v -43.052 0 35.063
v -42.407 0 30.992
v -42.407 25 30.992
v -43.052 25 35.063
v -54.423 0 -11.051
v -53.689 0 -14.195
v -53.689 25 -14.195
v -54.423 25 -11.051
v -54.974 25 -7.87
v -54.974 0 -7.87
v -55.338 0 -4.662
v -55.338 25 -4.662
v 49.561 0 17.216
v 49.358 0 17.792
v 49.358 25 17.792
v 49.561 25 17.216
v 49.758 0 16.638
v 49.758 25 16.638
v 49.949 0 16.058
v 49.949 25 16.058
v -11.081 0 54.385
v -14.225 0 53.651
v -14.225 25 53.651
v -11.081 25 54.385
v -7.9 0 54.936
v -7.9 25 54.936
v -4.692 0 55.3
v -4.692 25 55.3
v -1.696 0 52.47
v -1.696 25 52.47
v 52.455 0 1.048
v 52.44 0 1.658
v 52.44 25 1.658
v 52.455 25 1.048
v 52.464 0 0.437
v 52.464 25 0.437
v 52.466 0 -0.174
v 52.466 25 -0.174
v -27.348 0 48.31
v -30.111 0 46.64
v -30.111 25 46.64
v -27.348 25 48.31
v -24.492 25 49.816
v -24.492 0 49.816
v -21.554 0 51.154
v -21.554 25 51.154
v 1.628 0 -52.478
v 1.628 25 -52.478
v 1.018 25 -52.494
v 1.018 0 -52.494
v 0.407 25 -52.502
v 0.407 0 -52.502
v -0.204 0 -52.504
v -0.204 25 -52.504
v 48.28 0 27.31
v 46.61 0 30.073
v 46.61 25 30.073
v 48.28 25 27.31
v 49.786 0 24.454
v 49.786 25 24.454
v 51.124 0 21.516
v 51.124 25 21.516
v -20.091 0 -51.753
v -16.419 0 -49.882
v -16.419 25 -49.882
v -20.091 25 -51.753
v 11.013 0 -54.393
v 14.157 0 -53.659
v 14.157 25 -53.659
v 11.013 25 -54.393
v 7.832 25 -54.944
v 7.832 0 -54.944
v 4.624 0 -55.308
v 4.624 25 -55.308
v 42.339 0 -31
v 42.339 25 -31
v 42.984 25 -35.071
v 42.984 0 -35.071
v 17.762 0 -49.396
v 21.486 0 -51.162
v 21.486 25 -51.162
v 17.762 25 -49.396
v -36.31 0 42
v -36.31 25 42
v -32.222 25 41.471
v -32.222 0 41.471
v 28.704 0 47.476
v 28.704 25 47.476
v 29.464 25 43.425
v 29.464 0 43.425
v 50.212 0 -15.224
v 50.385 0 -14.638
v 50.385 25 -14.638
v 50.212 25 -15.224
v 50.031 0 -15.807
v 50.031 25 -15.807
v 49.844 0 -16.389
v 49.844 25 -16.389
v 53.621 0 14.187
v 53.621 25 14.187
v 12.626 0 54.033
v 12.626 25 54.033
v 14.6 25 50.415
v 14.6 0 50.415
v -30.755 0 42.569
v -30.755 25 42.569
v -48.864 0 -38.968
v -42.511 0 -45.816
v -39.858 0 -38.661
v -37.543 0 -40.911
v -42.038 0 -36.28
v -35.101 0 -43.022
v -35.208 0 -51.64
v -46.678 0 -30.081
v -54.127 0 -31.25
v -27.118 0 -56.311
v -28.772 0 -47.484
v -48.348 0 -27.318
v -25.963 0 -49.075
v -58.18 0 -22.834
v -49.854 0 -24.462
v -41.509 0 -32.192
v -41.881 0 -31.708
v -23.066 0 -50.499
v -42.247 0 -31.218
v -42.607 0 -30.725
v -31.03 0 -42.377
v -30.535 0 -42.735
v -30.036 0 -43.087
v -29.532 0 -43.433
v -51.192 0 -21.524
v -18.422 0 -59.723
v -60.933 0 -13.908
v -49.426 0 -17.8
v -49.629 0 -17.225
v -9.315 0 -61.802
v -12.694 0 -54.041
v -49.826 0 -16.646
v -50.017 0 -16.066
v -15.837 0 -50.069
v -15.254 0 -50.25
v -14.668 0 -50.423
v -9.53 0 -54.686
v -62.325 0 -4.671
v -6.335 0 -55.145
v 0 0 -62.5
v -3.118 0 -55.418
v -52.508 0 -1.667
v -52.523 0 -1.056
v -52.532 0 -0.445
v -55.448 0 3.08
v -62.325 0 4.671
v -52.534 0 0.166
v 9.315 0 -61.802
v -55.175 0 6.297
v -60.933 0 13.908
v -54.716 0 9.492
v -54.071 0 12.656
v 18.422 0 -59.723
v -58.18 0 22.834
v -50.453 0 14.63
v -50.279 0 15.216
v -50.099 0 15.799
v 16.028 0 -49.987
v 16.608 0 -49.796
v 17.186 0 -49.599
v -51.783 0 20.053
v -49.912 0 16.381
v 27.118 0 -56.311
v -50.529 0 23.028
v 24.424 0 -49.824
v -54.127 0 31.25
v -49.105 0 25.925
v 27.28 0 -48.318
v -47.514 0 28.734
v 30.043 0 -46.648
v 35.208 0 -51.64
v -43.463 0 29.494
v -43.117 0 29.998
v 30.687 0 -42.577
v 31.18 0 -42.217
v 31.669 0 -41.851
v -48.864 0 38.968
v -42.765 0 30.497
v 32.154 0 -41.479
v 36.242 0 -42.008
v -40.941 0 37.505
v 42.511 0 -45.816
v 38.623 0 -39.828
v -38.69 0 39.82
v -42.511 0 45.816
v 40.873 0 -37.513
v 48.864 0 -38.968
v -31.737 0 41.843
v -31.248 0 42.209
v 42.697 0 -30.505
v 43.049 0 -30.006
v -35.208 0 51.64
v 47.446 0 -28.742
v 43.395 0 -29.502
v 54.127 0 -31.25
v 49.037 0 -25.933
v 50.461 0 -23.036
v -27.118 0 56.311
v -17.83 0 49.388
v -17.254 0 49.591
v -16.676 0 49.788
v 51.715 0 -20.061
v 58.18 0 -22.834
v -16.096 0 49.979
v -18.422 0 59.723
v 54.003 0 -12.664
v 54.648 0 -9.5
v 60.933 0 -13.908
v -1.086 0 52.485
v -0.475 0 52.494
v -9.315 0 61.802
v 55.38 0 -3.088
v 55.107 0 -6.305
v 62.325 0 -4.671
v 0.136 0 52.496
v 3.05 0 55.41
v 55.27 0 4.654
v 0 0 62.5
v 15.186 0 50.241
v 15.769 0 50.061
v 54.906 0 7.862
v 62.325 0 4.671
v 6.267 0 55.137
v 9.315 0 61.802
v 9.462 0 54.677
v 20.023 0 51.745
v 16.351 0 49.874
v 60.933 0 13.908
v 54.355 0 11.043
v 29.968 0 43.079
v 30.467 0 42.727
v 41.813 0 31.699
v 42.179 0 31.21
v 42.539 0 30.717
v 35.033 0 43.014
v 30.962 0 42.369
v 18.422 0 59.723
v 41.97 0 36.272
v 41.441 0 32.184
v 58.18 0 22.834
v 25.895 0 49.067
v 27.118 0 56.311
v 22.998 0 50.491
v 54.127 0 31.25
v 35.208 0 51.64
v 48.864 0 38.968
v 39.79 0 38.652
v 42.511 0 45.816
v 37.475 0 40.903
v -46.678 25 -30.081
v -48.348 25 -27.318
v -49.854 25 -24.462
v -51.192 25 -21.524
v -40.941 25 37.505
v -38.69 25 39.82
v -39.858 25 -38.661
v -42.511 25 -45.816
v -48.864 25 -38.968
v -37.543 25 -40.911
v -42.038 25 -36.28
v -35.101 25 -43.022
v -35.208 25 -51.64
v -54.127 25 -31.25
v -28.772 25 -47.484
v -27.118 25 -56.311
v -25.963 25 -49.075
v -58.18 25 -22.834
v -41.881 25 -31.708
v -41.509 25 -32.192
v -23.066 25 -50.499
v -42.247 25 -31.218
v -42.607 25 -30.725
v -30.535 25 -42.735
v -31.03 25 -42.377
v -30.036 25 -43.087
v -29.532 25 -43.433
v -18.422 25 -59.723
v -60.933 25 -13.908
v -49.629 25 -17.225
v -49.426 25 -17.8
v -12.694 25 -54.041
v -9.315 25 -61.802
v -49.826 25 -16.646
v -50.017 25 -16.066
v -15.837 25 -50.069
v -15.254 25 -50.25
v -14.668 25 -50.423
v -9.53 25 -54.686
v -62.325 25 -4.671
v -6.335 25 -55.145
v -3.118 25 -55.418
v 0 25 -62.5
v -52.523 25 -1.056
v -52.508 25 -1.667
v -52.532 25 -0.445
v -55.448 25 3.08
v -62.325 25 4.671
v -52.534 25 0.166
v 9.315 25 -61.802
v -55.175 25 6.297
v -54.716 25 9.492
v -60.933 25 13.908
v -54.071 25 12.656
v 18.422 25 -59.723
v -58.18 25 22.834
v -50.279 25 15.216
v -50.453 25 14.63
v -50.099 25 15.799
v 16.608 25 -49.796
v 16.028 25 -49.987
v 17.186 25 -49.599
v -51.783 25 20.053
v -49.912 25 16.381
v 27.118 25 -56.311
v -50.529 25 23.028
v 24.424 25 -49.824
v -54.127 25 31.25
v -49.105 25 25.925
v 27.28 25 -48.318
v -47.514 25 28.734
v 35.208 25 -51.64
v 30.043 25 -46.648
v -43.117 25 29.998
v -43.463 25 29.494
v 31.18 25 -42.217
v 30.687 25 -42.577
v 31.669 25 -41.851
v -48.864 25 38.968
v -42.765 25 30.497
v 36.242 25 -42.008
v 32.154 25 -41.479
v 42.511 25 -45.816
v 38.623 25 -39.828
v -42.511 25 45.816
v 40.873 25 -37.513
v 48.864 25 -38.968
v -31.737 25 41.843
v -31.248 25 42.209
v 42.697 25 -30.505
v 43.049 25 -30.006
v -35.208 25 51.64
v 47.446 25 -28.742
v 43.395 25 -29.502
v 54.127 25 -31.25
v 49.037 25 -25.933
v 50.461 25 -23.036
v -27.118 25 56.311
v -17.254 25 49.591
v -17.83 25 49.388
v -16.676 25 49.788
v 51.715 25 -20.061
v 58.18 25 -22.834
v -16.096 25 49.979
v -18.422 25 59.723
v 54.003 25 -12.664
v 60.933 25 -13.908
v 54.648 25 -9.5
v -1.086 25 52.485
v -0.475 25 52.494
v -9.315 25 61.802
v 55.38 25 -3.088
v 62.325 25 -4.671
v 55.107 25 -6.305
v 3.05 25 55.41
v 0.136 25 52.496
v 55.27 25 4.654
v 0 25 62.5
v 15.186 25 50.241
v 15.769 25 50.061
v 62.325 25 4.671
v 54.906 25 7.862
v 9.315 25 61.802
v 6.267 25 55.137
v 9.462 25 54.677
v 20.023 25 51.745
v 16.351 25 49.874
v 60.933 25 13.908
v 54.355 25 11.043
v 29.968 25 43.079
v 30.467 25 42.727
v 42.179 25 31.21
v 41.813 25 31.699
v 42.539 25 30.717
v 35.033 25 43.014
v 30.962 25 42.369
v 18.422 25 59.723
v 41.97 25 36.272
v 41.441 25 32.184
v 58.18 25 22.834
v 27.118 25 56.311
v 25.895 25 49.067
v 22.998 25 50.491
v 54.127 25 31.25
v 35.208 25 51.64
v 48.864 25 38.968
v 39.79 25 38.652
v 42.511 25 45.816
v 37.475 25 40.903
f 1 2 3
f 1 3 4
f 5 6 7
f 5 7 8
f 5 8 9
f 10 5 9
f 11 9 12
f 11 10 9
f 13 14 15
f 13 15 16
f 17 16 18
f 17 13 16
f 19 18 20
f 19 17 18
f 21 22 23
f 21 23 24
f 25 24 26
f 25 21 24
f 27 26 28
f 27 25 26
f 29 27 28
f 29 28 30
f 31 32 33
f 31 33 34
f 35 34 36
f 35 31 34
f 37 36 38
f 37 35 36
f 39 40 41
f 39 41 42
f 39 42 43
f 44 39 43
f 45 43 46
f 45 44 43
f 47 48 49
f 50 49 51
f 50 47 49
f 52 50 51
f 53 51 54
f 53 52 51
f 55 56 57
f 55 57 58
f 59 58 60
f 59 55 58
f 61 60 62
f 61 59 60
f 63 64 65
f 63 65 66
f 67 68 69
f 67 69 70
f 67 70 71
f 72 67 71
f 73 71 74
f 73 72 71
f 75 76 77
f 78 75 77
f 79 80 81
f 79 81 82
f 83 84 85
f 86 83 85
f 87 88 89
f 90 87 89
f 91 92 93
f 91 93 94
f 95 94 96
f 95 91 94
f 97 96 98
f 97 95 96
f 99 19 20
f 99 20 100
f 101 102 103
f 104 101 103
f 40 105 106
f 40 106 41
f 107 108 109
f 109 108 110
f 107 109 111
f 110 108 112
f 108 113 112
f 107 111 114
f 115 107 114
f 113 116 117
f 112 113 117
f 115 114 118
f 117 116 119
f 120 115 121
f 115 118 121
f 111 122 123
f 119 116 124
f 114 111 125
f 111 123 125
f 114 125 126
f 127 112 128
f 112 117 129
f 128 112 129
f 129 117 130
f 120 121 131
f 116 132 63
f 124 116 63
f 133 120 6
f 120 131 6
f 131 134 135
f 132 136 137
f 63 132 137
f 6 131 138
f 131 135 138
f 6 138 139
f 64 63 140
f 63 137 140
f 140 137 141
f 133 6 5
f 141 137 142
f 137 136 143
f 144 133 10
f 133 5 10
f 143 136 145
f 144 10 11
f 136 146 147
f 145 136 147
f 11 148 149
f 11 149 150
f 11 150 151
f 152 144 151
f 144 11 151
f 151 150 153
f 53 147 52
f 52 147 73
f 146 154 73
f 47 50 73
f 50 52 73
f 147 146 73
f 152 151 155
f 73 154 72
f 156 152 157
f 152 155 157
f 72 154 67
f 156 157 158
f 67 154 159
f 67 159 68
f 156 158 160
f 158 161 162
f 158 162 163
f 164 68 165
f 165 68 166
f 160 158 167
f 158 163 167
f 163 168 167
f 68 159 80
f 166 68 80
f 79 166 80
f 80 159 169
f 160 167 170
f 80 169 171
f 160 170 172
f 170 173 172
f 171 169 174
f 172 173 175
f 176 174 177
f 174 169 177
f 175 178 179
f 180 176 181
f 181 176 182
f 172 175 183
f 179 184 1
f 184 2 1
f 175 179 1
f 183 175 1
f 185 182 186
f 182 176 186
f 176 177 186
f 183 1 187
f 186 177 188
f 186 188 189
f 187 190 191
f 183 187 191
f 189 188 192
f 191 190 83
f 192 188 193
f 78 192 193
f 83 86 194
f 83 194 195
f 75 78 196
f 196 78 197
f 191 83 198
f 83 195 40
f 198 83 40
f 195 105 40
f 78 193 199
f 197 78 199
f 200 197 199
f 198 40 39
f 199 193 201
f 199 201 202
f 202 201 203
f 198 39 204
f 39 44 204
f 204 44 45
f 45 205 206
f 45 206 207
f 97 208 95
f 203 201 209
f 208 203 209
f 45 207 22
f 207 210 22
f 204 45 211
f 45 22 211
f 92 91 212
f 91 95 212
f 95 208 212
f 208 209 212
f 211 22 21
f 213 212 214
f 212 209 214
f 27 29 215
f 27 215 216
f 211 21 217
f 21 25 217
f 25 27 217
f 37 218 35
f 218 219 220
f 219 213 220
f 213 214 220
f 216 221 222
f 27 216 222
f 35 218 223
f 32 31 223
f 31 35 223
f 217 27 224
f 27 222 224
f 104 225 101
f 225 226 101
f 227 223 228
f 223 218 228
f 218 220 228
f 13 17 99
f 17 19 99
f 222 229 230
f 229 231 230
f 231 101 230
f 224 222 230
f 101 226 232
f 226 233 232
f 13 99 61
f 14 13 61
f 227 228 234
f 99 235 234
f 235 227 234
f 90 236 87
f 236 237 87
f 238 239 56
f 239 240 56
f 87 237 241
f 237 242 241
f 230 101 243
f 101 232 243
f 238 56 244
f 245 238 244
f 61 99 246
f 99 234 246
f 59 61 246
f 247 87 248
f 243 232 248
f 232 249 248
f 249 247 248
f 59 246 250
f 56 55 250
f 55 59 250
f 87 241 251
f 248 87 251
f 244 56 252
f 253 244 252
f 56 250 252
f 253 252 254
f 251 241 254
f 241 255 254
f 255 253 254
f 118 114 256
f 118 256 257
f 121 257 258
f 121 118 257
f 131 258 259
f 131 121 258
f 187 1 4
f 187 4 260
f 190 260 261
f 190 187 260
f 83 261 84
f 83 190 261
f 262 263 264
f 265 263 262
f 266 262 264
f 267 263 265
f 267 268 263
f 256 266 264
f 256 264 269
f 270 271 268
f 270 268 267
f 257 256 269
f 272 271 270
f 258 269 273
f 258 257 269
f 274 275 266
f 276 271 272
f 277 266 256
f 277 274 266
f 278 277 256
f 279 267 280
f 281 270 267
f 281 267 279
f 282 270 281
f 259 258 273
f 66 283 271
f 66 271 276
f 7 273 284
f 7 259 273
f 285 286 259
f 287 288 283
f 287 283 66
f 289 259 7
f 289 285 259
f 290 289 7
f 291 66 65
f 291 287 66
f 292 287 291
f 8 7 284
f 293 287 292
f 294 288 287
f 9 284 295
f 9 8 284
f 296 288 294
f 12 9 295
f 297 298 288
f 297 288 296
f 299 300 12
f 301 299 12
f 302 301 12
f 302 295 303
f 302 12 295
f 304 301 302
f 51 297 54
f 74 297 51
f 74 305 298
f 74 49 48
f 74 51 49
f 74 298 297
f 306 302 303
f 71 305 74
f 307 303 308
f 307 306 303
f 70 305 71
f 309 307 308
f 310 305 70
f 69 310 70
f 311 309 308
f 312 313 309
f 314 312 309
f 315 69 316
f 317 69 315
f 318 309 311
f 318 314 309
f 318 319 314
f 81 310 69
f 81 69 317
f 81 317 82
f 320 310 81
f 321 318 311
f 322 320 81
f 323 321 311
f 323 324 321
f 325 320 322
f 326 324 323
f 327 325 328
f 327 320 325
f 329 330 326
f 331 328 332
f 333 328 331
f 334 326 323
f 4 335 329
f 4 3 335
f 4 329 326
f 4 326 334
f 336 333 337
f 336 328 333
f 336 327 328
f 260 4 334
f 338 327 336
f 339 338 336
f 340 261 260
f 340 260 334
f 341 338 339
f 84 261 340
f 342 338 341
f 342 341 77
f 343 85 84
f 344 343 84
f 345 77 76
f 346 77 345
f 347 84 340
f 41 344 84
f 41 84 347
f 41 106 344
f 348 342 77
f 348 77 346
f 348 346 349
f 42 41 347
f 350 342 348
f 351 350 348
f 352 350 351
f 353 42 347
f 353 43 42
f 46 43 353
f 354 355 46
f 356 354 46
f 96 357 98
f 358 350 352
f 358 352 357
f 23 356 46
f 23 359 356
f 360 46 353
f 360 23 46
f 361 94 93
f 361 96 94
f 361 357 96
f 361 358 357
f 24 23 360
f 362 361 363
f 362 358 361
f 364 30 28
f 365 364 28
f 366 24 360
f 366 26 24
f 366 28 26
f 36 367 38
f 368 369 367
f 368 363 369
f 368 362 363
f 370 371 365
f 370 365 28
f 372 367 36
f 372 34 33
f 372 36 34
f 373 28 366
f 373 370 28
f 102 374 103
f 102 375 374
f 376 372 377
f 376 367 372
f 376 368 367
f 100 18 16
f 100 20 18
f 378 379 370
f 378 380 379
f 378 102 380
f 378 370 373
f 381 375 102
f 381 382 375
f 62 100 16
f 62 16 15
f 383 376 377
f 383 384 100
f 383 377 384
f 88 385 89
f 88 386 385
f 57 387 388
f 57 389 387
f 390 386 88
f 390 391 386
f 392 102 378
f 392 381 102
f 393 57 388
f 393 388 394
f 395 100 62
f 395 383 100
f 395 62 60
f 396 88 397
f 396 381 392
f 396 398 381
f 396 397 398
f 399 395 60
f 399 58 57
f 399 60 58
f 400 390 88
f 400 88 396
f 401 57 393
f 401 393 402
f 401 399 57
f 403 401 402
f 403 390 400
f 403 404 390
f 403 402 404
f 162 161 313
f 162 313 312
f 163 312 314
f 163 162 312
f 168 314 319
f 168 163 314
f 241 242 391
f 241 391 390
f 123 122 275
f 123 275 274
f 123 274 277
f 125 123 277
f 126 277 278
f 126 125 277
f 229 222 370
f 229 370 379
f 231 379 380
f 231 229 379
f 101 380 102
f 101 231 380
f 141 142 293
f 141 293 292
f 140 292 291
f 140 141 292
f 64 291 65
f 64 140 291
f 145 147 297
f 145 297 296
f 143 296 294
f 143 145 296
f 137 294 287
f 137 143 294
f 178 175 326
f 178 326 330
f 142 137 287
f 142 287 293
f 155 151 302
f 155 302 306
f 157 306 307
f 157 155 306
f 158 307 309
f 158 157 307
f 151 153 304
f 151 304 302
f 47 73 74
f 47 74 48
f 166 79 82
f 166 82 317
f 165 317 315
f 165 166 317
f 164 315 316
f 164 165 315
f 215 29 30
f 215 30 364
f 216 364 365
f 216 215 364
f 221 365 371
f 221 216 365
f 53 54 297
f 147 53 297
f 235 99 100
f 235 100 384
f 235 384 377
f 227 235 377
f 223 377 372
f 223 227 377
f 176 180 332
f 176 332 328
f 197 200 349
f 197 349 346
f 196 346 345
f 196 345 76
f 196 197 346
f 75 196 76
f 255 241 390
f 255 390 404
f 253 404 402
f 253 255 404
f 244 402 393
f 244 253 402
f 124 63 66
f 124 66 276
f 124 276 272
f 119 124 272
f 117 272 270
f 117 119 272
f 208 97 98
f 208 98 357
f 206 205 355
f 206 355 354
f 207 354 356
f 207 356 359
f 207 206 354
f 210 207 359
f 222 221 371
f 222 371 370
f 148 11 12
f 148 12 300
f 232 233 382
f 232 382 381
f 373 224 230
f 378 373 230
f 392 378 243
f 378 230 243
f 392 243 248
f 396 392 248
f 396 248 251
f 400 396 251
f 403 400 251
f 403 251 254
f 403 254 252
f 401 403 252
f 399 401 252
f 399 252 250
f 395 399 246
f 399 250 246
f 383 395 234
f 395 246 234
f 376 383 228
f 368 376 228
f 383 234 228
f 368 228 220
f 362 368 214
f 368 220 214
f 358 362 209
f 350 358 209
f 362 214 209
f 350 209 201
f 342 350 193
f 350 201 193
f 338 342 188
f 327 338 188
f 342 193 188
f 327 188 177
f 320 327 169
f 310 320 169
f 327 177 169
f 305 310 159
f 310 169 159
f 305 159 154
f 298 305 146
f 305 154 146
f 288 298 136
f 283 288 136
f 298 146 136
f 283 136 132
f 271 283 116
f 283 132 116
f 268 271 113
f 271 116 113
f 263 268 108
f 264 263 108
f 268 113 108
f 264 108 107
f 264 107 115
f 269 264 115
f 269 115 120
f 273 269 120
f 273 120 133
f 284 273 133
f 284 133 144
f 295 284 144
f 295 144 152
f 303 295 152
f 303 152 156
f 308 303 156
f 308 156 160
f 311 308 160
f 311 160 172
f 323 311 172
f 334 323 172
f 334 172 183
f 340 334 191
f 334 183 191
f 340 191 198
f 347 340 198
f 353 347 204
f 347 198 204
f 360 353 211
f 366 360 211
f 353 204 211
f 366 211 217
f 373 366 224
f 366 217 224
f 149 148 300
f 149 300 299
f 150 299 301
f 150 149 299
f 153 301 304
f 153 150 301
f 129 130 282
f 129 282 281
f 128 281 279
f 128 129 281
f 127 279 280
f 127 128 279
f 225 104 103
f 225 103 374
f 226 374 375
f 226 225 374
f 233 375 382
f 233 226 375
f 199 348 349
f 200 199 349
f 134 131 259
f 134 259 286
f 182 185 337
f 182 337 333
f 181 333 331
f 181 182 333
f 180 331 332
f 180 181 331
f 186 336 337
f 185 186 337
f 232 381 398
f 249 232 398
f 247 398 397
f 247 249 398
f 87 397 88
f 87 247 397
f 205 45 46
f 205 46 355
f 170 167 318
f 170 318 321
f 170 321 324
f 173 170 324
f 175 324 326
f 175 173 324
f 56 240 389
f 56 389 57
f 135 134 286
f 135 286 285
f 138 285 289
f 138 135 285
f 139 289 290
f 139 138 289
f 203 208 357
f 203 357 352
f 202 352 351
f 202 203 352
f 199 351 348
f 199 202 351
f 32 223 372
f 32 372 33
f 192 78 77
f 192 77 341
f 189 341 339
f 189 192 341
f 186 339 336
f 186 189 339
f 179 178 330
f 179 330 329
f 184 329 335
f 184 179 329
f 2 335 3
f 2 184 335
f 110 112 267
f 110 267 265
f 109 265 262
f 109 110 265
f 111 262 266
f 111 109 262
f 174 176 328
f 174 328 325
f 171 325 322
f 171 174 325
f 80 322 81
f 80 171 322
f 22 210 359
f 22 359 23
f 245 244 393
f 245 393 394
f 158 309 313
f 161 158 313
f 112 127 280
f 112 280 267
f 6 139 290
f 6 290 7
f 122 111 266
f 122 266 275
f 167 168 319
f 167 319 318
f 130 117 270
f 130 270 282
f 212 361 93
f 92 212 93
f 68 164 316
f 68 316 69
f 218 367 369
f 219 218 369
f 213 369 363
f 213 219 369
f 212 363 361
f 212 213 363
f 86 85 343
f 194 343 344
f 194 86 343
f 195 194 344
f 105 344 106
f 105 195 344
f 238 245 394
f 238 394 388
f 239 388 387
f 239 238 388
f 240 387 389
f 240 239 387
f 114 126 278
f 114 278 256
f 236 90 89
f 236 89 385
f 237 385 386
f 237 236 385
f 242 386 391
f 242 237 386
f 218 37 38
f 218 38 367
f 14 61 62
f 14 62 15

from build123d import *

# Parameters (mm, degrees)
SKETCH1_R           = 62.5
BOSS_EXTRUDE1_DEPTH = 25
CAVITY1_DEPTH       = 25


# Read off the part's stored shape, not the designer's step: Cavity1
with BuildPart() as part:
    # Sketch1 → Boss-Extrude1 (new body)
    with BuildSketch(Plane(origin=(0, 0, 0), x_dir=(1, 0, 0), z_dir=(0, 1, 0))):
        with Locations(Location((0, 0, 0), (0, 0, 270))):
            Circle(SKETCH1_R)
    extrude(amount=BOSS_EXTRUDE1_DEPTH)

    # Cavity1 outline → Cavity1 (cut)
    with BuildSketch(Plane(origin=(0, 0, 0), x_dir=(1, 0, 0), z_dir=(0, 1, 0))):
        with BuildLine():
            Line((16.350867892, -49.873660473), (20.022970331, -51.745036944))
            ThreePointArc((20.022970331, -51.745036944), (24.456878574, -49.800038203), (28.704396647, -47.476000203))
            Line((28.704396647, -47.476000203), (29.464309883, -43.425207924))
            ThreePointArc((29.464309883, -43.425207924), (30.217762384, -42.903777412), (30.961999914, -42.369276757))
            Line((30.961999914, -42.369276757), (35.032663999, -43.014319485))
            ThreePointArc((35.032663999, -43.014319485), (38.648523661, -39.79436276), (41.969986165, -36.271516008))
            Line((41.969986165, -36.271516008), (41.440942946, -32.18415751))
            ThreePointArc((41.440942946, -32.18415751), (41.996387967, -31.455417996), (42.539030133, -30.717095621))
            Line((42.539030133, -30.717095621), (46.609790903, -30.07266333))
            ThreePointArc((46.609790903, -30.07266333), (49.053656447, -25.89294042), (51.12393549, -21.5161257))
            Line((51.12393549, -21.5161257), (49.357722251, -17.792300112))
            ThreePointArc((49.357722251, -17.792300112), (49.660788964, -16.927585698), (49.94871817, -16.05771374))
            Line((49.94871817, -16.05771374), (53.621101197, -14.186887953))
            ThreePointArc((53.621101197, -14.186887953), (54.653750036, -9.456539258), (55.270192281, -4.654189691))
            Line((55.270192281, -4.654189691), (52.43969828, -1.658411006))
            ThreePointArc((52.43969828, -1.658411006), (52.460720403, -0.742365963), (52.465752134, 0.173906448))
            Line((52.465752134, 0.173906448), (55.380278979, 3.087996269))
            ThreePointArc((55.380278979, 3.087996269), (54.900628251, 7.905931261), (54.002892036, 12.66372824))
            Line((54.002892036, 12.66372824), (50.385185747, 14.63821233))
            ThreePointArc((50.385185747, 14.63821233), (50.122105488, 15.515919131), (49.843747202, 16.388900869))
            Line((49.843747202, 16.388900869), (51.715123672, 20.061003308))
            ThreePointArc((51.715123672, 20.061003308), (49.770124931, 24.49491155), (47.446086932, 28.742429624))
            Line((47.446086932, 28.742429624), (43.395294653, 29.50234286))
            ThreePointArc((43.395294653, 29.50234286), (42.87386414, 30.255795361), (42.339363485, 31.000032891))
            Line((42.339363485, 31.000032891), (42.984406214, 35.070696976))
            ThreePointArc((42.984406214, 35.070696976), (39.764449489, 38.686556638), (36.241602736, 42.008019142))
            Line((36.241602736, 42.008019142), (32.154244239, 41.478975923))
            ThreePointArc((32.154244239, 41.478975923), (31.425504725, 42.034420944), (30.68718235, 42.57706311))
            Line((30.68718235, 42.57706311), (30.042750059, 46.64782388))
            ThreePointArc((30.042750059, 46.64782388), (25.863027148, 49.091689424), (21.486212429, 51.161968467))
            Line((21.486212429, 51.161968467), (17.762386841, 49.395755228))
            ThreePointArc((17.762386841, 49.395755228), (16.897672427, 49.698821941), (16.027800469, 49.986751147))
            Line((16.027800469, 49.986751147), (14.156974682, 53.659134174))
            ThreePointArc((14.156974682, 53.659134174), (9.426625987, 54.691783013), (4.62427642, 55.308225258))
            Line((4.62427642, 55.308225258), (1.628497735, 52.477731257))
            ThreePointArc((1.628497735, 52.477731257), (0.712452692, 52.49875338), (-0.20381972, 52.503785111))
            Line((-0.20381972, 52.503785111), (-3.11790954, 55.418311956))
            ThreePointArc((-3.11790954, 55.418311956), (-7.935844532, 54.938661228), (-12.693641511, 54.040925013))
            Line((-12.693641511, 54.040925013), (-14.668125602, 50.423218724))
            ThreePointArc((-14.668125602, 50.423218724), (-15.545832402, 50.160138465), (-16.41881414, 49.881780179))
            Line((-16.41881414, 49.881780179), (-20.090916579, 51.753156649))
            ThreePointArc((-20.090916579, 51.753156649), (-24.524824822, 49.808157908), (-28.772342895, 47.484119909))
            Line((-28.772342895, 47.484119909), (-29.532256132, 43.43332763))
            ThreePointArc((-29.532256132, 43.43332763), (-30.285708633, 42.911897117), (-31.029946162, 42.377396462))
            Line((-31.029946162, 42.377396462), (-35.100610248, 43.022439191))
            ThreePointArc((-35.100610248, 43.022439191), (-38.71646991, 39.802482465), (-42.037932414, 36.279635713))
            Line((-42.037932414, 36.279635713), (-41.508889194, 32.192277216))
            ThreePointArc((-41.508889194, 32.192277216), (-42.064334215, 31.463537702), (-42.606976382, 30.725215327))
            Line((-42.606976382, 30.725215327), (-46.677737151, 30.080783036))
            ThreePointArc((-46.677737151, 30.080783036), (-49.121602695, 25.901060125), (-51.191881738, 21.524245406))
            Line((-51.191881738, 21.524245406), (-49.425668499, 17.800419818))
            ThreePointArc((-49.425668499, 17.800419818), (-49.728735212, 16.935705404), (-50.016664419, 16.065833446))
            Line((-50.016664419, 16.065833446), (-53.689047445, 14.195007659))
            ThreePointArc((-53.689047445, 14.195007659), (-54.721696284, 9.464658964), (-55.33813853, 4.662309397))
            Line((-55.33813853, 4.662309397), (-52.507644528, 1.666530712))
            ThreePointArc((-52.507644528, 1.666530712), (-52.528666651, 0.750485669), (-52.533698382, -0.165786743))
            Line((-52.533698382, -0.165786743), (-55.448225228, -3.079876563))
            ThreePointArc((-55.448225228, -3.079876563), (-54.968574499, -7.897811555), (-54.070838284, -12.655608534))
            Line((-54.070838284, -12.655608534), (-50.453131995, -14.630092625))
            ThreePointArc((-50.453131995, -14.630092625), (-50.190051736, -15.507799425), (-49.91169345, -16.380781163))
            Line((-49.91169345, -16.380781163), (-51.783069921, -20.052883602))
            ThreePointArc((-51.783069921, -20.052883602), (-49.83807118, -24.486791845), (-47.51403318, -28.734309918))
            Line((-47.51403318, -28.734309918), (-43.463240901, -29.494223155))
            ThreePointArc((-43.463240901, -29.494223155), (-42.941810389, -30.247675656), (-42.407309734, -30.991913185))
            Line((-42.407309734, -30.991913185), (-43.052352462, -35.062577271))
            ThreePointArc((-43.052352462, -35.062577271), (-39.832395737, -38.678436932), (-36.309548985, -41.999899437))
            Line((-36.309548985, -41.999899437), (-32.222190487, -41.470856217))
            ThreePointArc((-32.222190487, -41.470856217), (-31.493450973, -42.026301238), (-30.755128598, -42.568943405))
            Line((-30.755128598, -42.568943405), (-30.110696307, -46.639704174))
            ThreePointArc((-30.110696307, -46.639704174), (-25.930973397, -49.083569718), (-21.554158677, -51.153848761))
            Line((-21.554158677, -51.153848761), (-17.830333089, -49.387635522))
            ThreePointArc((-17.830333089, -49.387635522), (-16.965618675, -49.690702235), (-16.095746717, -49.978631442))
            Line((-16.095746717, -49.978631442), (-14.22492093, -53.651014468))
            ThreePointArc((-14.22492093, -53.651014468), (-9.494572235, -54.683663307), (-4.692222668, -55.300105553))
            Line((-4.692222668, -55.300105553), (-1.696443983, -52.469611551))
            ThreePointArc((-1.696443983, -52.469611551), (-0.78039894, -52.490633674), (0.135873471, -52.495665405))
            Line((0.135873471, -52.495665405), (3.049963292, -55.410192251))
            ThreePointArc((3.049963292, -55.410192251), (7.867898284, -54.930541522), (12.625695263, -54.032805307))
            Line((12.625695263, -54.032805307), (14.600179353, -50.415099018))
            ThreePointArc((14.600179353, -50.415099018), (15.477886154, -50.152018759), (16.350867892, -49.873660473))
        make_face()
    extrude(amount=CAVITY1_DEPTH, mode=Mode.SUBTRACT)


solid = part.part
